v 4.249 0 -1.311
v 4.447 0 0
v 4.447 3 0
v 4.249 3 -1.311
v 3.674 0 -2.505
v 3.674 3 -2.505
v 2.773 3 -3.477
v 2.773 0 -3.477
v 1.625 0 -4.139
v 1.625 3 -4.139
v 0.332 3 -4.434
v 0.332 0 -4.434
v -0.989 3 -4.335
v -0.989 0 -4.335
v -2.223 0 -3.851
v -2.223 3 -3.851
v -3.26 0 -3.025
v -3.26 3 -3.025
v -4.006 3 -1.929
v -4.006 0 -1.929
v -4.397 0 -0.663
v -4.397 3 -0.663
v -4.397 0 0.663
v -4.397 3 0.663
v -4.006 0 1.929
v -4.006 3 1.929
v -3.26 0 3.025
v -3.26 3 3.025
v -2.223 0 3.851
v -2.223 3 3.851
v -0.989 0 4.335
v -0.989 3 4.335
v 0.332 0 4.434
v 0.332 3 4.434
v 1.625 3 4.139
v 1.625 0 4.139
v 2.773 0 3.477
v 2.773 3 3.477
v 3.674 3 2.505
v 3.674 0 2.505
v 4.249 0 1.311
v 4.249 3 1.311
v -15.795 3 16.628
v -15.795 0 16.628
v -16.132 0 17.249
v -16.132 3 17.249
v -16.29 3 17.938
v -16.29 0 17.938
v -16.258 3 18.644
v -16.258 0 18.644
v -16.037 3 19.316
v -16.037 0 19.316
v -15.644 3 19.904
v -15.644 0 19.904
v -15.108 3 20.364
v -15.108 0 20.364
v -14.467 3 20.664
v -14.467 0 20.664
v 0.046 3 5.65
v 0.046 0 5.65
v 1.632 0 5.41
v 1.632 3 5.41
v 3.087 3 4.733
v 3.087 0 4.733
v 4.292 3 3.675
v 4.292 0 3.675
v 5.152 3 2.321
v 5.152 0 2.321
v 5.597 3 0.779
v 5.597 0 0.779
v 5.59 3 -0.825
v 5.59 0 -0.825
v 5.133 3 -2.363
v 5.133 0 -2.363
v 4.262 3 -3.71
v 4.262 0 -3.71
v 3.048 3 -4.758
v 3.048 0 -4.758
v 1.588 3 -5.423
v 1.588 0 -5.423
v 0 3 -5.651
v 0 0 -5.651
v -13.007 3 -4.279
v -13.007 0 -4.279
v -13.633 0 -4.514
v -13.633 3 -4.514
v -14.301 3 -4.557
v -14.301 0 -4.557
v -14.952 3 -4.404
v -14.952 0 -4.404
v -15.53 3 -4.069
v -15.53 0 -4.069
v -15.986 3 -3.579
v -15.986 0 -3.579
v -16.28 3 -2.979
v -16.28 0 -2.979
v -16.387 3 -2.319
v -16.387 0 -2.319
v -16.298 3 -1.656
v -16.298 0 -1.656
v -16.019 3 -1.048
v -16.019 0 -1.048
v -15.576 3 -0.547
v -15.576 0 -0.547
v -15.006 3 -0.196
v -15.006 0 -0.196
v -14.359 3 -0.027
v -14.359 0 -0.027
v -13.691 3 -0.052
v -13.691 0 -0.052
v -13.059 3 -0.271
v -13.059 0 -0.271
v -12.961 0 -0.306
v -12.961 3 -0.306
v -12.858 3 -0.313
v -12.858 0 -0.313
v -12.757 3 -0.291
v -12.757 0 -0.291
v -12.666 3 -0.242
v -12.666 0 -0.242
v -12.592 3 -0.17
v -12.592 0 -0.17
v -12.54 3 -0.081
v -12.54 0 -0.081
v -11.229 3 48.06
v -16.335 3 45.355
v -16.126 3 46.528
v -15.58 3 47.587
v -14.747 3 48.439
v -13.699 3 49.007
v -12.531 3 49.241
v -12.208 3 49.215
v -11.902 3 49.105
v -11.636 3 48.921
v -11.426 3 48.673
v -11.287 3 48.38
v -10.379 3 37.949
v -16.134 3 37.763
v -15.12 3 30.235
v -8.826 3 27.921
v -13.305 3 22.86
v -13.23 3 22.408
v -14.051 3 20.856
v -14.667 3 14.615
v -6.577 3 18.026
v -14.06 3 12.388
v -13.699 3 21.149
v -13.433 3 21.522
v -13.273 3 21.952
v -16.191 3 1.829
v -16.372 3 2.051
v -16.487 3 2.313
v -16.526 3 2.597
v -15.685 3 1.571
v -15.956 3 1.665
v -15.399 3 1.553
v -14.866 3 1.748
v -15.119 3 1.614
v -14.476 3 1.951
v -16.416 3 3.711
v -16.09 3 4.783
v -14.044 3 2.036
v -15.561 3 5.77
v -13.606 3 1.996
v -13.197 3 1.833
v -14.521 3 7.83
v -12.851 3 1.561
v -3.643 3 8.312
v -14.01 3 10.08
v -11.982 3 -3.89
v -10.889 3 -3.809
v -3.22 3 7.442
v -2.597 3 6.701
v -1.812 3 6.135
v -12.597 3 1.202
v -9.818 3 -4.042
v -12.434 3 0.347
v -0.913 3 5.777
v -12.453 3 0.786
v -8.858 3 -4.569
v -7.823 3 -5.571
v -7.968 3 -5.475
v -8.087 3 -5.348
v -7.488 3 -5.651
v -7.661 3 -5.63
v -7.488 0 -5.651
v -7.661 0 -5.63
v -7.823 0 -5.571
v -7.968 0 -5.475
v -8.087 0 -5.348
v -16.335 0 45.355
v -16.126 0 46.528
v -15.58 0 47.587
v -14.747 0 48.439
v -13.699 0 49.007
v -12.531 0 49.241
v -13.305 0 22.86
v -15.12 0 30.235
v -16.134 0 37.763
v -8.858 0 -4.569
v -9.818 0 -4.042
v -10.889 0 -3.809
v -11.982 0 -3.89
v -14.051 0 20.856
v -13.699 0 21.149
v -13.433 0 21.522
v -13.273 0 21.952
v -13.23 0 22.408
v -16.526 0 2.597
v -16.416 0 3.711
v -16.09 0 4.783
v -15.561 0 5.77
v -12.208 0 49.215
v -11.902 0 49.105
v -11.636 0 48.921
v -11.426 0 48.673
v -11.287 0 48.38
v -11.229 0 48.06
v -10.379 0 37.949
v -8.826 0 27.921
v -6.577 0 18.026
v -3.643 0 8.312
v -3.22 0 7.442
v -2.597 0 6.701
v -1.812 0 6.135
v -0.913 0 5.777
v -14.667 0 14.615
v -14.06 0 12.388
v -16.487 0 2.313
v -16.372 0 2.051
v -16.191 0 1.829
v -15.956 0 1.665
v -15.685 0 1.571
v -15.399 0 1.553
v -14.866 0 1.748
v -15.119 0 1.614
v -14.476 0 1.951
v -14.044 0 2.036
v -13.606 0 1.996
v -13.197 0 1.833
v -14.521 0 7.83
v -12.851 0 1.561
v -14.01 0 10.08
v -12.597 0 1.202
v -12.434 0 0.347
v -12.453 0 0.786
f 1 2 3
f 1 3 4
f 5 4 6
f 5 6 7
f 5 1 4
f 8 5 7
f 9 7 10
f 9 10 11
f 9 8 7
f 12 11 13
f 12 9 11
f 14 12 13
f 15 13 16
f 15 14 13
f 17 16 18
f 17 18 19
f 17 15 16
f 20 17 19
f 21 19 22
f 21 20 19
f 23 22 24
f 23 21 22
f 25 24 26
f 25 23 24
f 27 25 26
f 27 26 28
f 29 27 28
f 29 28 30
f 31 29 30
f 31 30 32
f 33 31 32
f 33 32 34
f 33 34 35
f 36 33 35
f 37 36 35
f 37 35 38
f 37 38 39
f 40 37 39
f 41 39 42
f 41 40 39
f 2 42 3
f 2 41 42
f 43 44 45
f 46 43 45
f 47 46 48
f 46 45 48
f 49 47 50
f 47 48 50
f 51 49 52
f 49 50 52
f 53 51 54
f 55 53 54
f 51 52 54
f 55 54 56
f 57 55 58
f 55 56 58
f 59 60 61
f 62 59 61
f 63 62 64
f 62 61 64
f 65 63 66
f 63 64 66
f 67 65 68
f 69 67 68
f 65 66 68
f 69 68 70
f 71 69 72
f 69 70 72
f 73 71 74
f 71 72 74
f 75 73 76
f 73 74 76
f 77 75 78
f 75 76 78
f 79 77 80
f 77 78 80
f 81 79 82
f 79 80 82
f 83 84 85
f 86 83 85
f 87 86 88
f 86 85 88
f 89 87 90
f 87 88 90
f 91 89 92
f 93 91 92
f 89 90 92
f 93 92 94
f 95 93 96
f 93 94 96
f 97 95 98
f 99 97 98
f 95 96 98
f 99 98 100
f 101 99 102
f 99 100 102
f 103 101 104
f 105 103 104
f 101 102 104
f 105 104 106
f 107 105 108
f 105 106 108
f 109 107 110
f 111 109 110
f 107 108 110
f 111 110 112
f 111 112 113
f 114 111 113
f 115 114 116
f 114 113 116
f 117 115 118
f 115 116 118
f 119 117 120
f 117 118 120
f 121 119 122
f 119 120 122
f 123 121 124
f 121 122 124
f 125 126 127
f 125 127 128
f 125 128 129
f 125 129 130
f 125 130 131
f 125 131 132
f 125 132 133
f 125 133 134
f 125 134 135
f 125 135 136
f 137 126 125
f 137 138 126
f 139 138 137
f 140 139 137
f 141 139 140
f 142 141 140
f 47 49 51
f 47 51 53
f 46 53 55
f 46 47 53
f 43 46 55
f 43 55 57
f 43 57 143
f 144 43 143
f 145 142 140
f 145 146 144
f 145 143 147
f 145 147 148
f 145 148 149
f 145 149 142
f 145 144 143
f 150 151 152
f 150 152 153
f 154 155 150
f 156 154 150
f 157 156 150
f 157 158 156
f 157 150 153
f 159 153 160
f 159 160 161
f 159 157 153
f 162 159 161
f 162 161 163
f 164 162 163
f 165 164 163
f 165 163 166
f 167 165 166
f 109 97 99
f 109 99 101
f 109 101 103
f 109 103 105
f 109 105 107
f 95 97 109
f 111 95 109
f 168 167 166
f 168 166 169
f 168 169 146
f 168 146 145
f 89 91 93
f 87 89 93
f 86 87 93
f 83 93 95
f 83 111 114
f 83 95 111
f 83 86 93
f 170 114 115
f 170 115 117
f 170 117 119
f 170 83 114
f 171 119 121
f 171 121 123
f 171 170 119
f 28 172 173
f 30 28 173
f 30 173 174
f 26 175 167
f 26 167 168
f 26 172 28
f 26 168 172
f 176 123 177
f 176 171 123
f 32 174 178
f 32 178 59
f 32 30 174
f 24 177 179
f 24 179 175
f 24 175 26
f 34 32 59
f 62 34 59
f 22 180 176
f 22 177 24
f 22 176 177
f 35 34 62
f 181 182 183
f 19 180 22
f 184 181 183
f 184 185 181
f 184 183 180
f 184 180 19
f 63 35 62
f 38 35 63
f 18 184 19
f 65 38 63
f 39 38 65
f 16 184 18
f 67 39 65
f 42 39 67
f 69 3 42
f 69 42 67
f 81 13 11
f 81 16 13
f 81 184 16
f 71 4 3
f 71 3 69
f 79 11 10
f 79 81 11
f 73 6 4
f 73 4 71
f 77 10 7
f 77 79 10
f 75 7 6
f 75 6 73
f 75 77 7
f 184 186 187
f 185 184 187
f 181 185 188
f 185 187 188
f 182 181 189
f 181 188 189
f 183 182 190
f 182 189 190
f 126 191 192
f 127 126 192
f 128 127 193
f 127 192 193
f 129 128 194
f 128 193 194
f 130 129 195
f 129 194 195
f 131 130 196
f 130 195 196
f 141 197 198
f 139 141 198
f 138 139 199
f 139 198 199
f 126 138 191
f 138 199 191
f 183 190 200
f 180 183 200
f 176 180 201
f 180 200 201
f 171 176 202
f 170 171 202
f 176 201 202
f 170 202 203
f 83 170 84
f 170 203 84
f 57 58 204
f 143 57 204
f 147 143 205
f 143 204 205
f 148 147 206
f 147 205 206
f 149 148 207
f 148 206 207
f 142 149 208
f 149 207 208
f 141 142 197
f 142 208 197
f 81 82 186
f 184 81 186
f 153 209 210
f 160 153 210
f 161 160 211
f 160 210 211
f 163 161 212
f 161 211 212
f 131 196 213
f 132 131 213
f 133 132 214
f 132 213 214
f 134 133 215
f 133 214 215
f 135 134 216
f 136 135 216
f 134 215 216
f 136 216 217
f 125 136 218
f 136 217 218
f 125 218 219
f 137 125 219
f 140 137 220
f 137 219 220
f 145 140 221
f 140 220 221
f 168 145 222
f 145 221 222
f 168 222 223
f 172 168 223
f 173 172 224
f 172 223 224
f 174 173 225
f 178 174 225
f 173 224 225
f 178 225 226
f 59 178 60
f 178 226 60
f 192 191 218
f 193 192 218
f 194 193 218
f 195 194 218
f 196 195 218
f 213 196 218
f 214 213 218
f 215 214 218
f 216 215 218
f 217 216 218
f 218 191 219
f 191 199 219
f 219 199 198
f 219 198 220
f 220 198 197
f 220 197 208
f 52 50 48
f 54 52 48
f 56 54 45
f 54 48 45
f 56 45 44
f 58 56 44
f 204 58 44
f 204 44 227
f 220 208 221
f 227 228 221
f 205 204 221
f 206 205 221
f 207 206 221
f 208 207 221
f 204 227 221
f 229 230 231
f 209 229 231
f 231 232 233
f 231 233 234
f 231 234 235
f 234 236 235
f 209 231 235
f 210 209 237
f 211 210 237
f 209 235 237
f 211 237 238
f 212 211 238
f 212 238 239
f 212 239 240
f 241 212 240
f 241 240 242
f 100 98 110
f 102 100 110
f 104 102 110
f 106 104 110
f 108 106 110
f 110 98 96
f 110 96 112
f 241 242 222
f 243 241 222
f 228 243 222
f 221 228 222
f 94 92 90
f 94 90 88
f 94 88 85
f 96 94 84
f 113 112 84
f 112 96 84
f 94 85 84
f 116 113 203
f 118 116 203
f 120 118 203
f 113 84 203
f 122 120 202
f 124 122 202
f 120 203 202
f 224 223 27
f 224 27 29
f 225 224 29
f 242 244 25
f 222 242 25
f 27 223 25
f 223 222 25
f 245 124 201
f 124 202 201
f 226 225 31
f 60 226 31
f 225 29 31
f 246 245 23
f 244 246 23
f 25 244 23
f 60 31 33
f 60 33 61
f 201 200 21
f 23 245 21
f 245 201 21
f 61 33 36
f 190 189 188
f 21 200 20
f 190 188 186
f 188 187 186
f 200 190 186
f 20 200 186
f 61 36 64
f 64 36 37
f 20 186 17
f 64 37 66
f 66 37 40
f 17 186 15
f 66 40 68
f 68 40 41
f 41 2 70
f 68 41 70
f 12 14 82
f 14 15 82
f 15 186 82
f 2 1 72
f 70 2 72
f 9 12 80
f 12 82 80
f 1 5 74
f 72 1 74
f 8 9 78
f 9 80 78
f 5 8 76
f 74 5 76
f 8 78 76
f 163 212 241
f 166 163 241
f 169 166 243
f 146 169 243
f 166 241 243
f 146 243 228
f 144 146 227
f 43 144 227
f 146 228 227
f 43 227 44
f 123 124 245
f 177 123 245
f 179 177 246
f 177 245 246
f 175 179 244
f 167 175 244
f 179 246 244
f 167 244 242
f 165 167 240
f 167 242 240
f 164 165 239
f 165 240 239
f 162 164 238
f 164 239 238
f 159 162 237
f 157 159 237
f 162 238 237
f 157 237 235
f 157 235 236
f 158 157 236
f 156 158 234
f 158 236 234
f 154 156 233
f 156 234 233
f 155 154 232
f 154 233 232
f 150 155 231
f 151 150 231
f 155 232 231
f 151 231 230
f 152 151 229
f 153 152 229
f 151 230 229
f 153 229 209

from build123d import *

# Parameters (mm, degrees)
CROQUIS1_R              = 4.446768191
SALIENTE_EXTRUIR1_DEPTH = 3


with BuildPart() as part:
    # Croquis1 → Saliente-Extruir1 (new body)
    with BuildSketch(Plane(origin=(0, 0, 0), x_dir=(1, 0, 0), z_dir=(0, 1, 0))):
        with BuildLine():
            ThreePointArc((0.04624071, -5.650316034), (5.650457939, 0.023120548), (0, 5.650505241))
            Line((0, 5.650505241), (-6.558714934, 5.650505241))
            Line((-6.558714934, 5.650505241), (-7.488201893, 5.650505241))
            ThreePointArc((-7.488201893, 5.650505241), (-7.823446184, 5.570700791), (-8.086776283, 5.348406518))
            ThreePointArc((-8.086776283, 5.348406518), (-10.345385807, 3.886616052), (-13.007001279, 4.2789825))
            ThreePointArc((-13.007001279, 4.2789825), (-16.387283849, 2.318589671), (-13.058926803, 0.271276879))
            ThreePointArc((-13.058926803, 0.271276879), (-12.757166646, 0.290746917), (-12.539738197, 0.080596626))
            ThreePointArc((-12.539738197, 0.080596626), (-13.014703567, -1.709451511), (-14.866296536, -1.747764912))
            ThreePointArc((-14.866296536, -1.747764912), (-15.955750761, -1.665010286), (-16.52578224, -2.597117012))
            ThreePointArc((-16.52578224, -2.597117012), (-16.279366787, -4.255127031), (-15.561421483, -5.769812589))
            ThreePointArc((-15.561421483, -5.769812589), (-13.964054479, -11.235683534), (-15.795045548, -16.627788712))
            ThreePointArc((-15.795045548, -16.627788712), (-16.170307553, -18.987627294), (-14.467414276, -20.663877332))
            ThreePointArc((-14.467414276, -20.663877332), (-13.433418752, -21.52247795), (-13.304756207, -22.860307429))
            ThreePointArc((-13.304756207, -22.860307429), (-15.728318678, -33.985404535), (-16.335024288, -45.355248377))
            ThreePointArc((-16.335024288, -45.355248377), (-15.195125313, -48.044049913), (-12.531403036, -49.241383204))
            ThreePointArc((-12.531403036, -49.241383204), (-11.635581739, -48.920558505), (-11.228904984, -48.060303717))
            ThreePointArc((-11.228904984, -48.060303717), (-8.826265832, -27.920860577), (-3.642833223, -8.31214131))
            ThreePointArc((-3.642833223, -8.31214131), (-2.222317675, -6.393569379), (0.04624071, -5.650316034))
        make_face()
        Circle(CROQUIS1_R, mode=Mode.SUBTRACT)
    extrude(amount=SALIENTE_EXTRUIR1_DEPTH)


solid = part.part
